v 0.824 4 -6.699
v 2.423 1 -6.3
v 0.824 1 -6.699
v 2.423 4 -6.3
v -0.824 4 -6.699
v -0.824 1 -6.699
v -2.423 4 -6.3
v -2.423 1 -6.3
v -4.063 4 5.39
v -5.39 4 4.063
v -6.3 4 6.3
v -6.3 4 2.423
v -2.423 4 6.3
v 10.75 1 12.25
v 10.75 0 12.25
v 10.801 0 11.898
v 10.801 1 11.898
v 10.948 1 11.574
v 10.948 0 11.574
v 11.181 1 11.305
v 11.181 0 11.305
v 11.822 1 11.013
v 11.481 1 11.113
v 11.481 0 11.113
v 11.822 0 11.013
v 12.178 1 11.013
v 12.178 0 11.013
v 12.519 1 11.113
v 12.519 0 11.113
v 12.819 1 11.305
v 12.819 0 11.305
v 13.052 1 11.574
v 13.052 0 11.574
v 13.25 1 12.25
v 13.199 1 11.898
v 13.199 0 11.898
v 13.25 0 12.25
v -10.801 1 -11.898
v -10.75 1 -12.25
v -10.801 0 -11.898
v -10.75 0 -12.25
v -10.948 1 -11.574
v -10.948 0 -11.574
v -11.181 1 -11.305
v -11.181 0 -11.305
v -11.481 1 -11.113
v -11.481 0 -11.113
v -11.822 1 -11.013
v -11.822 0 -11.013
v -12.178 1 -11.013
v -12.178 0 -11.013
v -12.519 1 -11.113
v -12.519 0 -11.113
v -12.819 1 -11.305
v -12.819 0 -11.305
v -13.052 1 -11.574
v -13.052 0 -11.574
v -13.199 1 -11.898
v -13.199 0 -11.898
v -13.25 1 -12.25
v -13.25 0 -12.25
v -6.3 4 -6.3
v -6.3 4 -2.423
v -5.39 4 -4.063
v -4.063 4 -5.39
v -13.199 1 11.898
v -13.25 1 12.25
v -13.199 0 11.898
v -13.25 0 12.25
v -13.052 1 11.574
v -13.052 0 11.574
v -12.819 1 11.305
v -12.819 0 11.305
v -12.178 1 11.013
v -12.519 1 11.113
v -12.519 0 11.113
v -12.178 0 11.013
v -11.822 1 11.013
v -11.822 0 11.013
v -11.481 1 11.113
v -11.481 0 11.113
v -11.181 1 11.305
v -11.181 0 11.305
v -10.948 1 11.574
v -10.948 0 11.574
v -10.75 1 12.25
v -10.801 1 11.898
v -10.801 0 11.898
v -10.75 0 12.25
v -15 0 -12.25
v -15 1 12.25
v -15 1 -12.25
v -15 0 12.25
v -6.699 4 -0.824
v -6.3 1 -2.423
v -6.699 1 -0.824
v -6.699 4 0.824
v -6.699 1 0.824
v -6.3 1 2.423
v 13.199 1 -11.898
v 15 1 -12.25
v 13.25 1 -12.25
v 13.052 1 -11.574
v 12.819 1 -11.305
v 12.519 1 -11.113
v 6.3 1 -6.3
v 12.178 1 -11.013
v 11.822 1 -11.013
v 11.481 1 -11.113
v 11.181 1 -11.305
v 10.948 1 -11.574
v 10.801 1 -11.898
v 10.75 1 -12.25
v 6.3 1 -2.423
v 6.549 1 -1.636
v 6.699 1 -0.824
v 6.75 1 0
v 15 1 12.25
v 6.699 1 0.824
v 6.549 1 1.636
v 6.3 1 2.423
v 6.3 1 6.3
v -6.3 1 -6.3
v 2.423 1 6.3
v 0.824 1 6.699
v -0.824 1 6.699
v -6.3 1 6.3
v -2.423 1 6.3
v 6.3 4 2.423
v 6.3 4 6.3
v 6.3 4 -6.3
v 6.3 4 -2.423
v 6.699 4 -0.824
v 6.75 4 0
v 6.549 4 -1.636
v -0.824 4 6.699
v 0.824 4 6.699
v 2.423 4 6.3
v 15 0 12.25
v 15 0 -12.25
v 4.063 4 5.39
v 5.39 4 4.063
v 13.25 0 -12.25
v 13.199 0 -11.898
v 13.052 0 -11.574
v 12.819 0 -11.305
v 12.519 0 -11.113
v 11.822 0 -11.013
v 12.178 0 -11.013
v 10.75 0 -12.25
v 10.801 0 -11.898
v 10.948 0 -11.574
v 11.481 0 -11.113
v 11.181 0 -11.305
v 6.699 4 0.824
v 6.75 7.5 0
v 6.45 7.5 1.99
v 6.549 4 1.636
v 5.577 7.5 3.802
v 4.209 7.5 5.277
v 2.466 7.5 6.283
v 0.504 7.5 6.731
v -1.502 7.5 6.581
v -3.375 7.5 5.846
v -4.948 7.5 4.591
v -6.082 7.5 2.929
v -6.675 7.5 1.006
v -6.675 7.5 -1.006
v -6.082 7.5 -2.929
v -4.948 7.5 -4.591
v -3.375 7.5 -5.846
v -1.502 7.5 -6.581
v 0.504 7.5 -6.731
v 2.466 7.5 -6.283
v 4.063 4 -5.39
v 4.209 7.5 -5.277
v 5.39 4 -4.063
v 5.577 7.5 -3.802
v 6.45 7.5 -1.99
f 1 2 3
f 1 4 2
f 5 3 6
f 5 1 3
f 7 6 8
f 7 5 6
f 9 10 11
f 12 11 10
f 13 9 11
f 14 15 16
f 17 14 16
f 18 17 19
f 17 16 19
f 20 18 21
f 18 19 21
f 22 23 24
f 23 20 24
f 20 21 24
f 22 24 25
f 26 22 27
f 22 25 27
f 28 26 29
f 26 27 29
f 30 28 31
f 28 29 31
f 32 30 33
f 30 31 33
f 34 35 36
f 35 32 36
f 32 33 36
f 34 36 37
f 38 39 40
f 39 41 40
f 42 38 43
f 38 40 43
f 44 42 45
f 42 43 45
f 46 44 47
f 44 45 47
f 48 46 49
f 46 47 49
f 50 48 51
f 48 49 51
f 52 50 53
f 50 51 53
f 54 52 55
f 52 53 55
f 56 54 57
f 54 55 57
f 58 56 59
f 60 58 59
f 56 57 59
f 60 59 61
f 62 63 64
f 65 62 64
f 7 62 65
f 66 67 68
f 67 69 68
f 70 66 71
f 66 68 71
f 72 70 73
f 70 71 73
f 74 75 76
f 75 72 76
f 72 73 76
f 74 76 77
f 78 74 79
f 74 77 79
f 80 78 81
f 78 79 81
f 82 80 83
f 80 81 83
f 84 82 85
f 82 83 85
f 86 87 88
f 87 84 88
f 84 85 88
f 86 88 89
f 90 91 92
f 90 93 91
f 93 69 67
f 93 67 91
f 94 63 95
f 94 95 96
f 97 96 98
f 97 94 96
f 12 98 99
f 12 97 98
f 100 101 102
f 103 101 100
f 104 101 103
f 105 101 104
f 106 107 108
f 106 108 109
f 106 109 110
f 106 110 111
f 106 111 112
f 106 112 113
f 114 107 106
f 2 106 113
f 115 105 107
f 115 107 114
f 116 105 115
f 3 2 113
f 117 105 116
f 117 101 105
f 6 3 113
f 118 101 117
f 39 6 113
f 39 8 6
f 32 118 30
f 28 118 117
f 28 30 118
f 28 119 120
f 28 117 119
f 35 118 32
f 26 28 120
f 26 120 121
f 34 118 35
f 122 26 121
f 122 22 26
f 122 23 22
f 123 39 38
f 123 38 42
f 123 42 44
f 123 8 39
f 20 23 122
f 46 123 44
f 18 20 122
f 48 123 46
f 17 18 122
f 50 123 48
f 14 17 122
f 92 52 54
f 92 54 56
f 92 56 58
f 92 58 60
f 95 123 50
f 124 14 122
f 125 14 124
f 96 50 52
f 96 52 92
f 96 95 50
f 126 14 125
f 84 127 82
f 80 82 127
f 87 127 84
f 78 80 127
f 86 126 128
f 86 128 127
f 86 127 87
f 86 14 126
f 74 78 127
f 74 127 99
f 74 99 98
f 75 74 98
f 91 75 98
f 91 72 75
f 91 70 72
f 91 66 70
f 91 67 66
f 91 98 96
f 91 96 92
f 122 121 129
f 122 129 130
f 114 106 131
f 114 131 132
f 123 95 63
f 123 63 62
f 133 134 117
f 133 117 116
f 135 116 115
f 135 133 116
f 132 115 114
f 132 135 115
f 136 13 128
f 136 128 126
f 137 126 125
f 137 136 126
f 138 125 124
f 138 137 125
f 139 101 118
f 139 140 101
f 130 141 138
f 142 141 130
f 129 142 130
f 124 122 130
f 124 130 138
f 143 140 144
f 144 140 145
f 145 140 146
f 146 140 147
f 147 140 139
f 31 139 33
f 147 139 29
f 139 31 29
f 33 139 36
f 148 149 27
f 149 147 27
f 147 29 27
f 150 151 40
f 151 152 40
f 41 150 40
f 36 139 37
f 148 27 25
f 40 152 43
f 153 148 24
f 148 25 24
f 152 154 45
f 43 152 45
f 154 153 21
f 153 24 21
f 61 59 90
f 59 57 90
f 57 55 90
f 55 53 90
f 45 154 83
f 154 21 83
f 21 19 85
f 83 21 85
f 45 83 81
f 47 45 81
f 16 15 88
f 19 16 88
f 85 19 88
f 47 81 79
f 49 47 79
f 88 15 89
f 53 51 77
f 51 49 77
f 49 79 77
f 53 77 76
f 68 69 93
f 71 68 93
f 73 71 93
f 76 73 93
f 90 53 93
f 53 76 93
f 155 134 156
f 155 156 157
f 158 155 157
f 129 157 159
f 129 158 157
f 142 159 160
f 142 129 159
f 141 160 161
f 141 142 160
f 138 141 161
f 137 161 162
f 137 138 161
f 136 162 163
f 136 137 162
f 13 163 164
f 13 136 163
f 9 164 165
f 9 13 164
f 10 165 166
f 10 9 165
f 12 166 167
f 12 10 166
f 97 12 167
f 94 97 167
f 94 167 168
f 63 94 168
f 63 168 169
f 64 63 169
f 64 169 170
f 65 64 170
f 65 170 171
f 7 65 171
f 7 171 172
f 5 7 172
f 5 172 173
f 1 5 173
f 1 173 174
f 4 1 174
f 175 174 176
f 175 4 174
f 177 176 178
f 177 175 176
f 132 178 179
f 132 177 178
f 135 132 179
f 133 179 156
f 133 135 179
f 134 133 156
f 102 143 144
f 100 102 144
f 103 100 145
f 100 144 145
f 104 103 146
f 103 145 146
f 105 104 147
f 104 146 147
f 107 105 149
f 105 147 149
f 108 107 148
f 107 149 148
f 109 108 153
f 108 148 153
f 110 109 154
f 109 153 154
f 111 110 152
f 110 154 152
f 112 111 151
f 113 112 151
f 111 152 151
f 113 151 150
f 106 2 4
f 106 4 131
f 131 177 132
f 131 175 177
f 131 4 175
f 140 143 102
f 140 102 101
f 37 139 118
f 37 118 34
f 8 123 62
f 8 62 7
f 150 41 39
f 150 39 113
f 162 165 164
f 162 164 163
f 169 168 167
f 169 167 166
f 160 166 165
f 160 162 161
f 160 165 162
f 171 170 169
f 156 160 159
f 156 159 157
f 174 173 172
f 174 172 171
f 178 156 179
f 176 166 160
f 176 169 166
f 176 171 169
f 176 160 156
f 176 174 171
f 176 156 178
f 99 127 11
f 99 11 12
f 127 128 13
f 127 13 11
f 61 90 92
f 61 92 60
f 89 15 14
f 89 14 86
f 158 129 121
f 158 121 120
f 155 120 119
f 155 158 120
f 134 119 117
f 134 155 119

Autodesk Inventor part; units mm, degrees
ref_plane "YZ Plane" through (0, 0, 0) normal (1, 0, 0) x (0, 1, 0)
ref_plane "XZ Plane" through (0, 0, 0) normal (0, 1, 0) x (-1, 0, 0)
ref_plane "XY Plane" through (0, 0, 0) normal (0, 0, 1) x (1, 0, 0)
sketch "Sketch1" plane through (0, 0, 0) normal (0, 1, 0) x (-1, 0, 0)
  line L0 (-15, 12.25) -> (15, 12.25)
  line L1 (15, 12.25) -> (15, -12.25)
  line L2 (15, -12.25) -> (-15, -12.25)
  line L3 (-15, -12.25) -> (-15, 12.25)
  line L4 (-15, 12.25) -> (15, -12.25) construction
  line L5 (15, 12.25) -> (-15, -12.25) construction
  line L6 (-12, 12.25) -> (12, 12.25)
  line L7 (12, 12.25) -> (12, -12.25)
  line L8 (12, -12.25) -> (-12, -12.25)
  line L9 (-12, -12.25) -> (-12, 12.25)
  line L10 (-12, 12.25) -> (12, -12.25) construction
  line L11 (12, 12.25) -> (-12, -12.25) construction
  circle A0 centre (12, -12.25) radius 1.25
  circle A1 centre (-12, -12.25) radius 1.25
  circle A2 centre (-12, 12.25) radius 1.25
  circle A3 centre (12, 12.25) radius 1.25
  point P0 (0, 0)
  point P1 (13.25, 12.25)
  point P2 (10.75, 12.25)
  point P3 (-10.75, 12.25)
  point P4 (-13.25, 12.25)
  point P5 (-13.25, -12.25)
  point P6 (-10.75, -12.25)
  point P7 (10.75, -12.25)
  point P8 (13.25, -12.25)
  dimension "d0" = 30
  dimension "d1" = 24.5
  dimension "d2" = 24
  dimension "d3" = 2.5
extrude "Extrusion1" add sketch "Sketch1" along normal blind 1 contours L0 A3 L7 A0 L2 A1 L9 A2 | A2 L9 A1 L2 L3 L0 | L0 L1 L2 A0 L7 A3
sketch "Sketch2" plane through (0, 1, 0) normal (0, 1, 0) x (1, 0, 0)
  line L0 (-6.3, 6.3) -> (6.3, 6.3)
  line L1 (6.3, 6.3) -> (6.3, -6.3)
  line L2 (6.3, -6.3) -> (-6.3, -6.3)
  line L3 (-6.3, -6.3) -> (-6.3, 6.3)
  line L4 (-6.3, 6.3) -> (6.3, -6.3) construction
  line L5 (6.3, 6.3) -> (-6.3, -6.3) construction
  point P0 (0, 0)
  dimension "d6" = 12.6
  dimension "d7" = 12.6
extrude "Extrusion2" add sketch "Sketch2" along normal blind 3
sketch "Sketch3" plane through (0, 4, 0) normal (0, 1, 0) x (1, 0, 0)
  circle A0 centre (0, 0) radius 6.75
  dimension "d10" = 13.5
extrude "Extrusion3" add sketch "Sketch3" along normal blind 3.5 and the other way blind 3
properties part number "Camera"
